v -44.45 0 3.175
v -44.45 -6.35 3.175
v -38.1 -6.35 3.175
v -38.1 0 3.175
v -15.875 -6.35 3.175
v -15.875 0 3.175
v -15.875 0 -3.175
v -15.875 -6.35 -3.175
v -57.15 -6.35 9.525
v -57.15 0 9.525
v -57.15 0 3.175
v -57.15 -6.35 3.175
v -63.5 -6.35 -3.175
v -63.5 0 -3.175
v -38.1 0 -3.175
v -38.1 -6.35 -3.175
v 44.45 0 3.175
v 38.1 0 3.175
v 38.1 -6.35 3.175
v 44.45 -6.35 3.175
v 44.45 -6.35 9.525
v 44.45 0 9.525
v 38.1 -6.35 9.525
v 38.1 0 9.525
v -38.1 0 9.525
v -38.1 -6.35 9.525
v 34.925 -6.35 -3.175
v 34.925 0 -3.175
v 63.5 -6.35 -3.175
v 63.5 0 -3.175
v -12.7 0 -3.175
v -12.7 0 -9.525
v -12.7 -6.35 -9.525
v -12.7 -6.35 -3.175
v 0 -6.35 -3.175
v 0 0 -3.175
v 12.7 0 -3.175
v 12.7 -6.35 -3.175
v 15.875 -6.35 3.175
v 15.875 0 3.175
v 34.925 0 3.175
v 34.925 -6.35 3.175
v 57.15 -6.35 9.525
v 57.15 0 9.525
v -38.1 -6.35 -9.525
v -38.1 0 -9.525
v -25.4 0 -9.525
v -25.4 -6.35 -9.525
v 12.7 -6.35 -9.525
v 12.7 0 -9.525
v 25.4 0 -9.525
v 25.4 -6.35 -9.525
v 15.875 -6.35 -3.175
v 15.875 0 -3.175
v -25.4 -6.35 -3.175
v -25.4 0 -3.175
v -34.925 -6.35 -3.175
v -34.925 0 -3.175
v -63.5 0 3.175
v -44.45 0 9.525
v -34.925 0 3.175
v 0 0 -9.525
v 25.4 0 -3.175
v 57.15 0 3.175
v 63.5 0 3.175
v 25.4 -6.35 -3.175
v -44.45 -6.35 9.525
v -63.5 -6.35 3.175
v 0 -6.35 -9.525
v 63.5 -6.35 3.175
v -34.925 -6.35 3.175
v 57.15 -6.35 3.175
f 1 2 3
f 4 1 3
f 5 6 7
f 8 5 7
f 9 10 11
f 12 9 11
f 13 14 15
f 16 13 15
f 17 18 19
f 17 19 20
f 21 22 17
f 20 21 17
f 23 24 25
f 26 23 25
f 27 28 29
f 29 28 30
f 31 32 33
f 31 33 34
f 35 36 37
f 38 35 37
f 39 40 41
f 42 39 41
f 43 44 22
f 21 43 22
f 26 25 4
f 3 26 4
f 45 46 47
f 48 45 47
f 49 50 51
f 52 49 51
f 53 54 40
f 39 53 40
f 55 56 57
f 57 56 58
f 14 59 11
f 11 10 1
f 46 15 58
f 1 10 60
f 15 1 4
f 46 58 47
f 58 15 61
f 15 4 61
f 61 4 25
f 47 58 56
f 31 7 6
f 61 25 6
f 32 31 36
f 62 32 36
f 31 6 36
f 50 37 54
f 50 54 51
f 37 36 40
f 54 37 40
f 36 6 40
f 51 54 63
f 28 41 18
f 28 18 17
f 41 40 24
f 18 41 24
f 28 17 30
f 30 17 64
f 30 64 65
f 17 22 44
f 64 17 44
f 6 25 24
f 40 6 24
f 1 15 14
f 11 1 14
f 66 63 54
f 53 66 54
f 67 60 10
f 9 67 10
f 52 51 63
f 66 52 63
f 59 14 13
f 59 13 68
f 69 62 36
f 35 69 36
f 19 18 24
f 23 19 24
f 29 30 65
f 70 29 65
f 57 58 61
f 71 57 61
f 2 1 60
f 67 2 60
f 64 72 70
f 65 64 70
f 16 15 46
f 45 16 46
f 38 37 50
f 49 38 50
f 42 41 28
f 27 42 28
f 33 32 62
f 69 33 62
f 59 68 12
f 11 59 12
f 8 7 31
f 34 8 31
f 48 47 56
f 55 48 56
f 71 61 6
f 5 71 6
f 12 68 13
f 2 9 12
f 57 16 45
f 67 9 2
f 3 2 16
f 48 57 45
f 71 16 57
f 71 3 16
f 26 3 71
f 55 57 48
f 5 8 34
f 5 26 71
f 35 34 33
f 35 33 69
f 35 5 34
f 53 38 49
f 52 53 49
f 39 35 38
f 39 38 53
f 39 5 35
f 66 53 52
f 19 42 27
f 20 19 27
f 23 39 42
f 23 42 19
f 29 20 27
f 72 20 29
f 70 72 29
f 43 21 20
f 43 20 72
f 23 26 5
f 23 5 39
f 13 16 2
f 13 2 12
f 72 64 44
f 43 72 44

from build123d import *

# Parameters (mm, degrees)
F0_W     = 6.35
F0_H     = 6.35
F0_W_2   = 12.7
F1_DEPTH = 6.35


# Not quite as in the source:
# - a feature names something its author has since deleted; it is built from what else it names


with BuildPart() as f1:
    # F0 (on Front) → F1 (new body)
    with BuildSketch(Plane.XZ):
        Polygon((38.1, 3.175), (38.1, 9.525), (-38.1, 9.525), (-38.1, 3.175), (-38.1, -3.175), (-34.925, -3.175), (-34.925, 3.175), (-15.875, 3.175), (-15.875, -3.175), (-12.7, -3.175), (0, -3.175), (12.7, -3.175), (15.875, -3.175), (15.875, 3.175), (34.925, 3.175), (34.925, -3.175), (38.1, -3.175), align=None)
        Polygon((-44.45, 3.175), (-44.45, 9.525), (-57.15, 9.525), (-57.15, 3.175), (-57.15, -3.175), (-44.45, -3.175), align=None)
        with Locations((-60.325, 0)):
            Rectangle(F0_W, F0_H)
        with Locations((-41.275, 0)):
            Rectangle(F0_W, F0_H)
        with Locations((41.275, 0)):
            Rectangle(F0_W, F0_H)
        with Locations((60.325, 0)):
            Rectangle(F0_W, F0_H)
        Polygon((57.15, 3.175), (57.15, 9.525), (44.45, 9.525), (44.45, 3.175), (44.45, -3.175), (57.15, -3.175), align=None)
        Polygon((-34.925, -3.175), (-38.1, -3.175), (-38.1, -9.525), (-25.4, -9.525), (-25.4, -3.175), align=None)
        with Locations((-6.35, -6.35)):
            Rectangle(F0_W_2, F0_H)
        Polygon((12.7, -9.525), (25.4, -9.525), (25.4, -3.175), (19.05, -3.175), (15.875, -3.175), (12.7, -3.175), align=None)
    extrude(amount=F1_DEPTH)


solid = f1.part
